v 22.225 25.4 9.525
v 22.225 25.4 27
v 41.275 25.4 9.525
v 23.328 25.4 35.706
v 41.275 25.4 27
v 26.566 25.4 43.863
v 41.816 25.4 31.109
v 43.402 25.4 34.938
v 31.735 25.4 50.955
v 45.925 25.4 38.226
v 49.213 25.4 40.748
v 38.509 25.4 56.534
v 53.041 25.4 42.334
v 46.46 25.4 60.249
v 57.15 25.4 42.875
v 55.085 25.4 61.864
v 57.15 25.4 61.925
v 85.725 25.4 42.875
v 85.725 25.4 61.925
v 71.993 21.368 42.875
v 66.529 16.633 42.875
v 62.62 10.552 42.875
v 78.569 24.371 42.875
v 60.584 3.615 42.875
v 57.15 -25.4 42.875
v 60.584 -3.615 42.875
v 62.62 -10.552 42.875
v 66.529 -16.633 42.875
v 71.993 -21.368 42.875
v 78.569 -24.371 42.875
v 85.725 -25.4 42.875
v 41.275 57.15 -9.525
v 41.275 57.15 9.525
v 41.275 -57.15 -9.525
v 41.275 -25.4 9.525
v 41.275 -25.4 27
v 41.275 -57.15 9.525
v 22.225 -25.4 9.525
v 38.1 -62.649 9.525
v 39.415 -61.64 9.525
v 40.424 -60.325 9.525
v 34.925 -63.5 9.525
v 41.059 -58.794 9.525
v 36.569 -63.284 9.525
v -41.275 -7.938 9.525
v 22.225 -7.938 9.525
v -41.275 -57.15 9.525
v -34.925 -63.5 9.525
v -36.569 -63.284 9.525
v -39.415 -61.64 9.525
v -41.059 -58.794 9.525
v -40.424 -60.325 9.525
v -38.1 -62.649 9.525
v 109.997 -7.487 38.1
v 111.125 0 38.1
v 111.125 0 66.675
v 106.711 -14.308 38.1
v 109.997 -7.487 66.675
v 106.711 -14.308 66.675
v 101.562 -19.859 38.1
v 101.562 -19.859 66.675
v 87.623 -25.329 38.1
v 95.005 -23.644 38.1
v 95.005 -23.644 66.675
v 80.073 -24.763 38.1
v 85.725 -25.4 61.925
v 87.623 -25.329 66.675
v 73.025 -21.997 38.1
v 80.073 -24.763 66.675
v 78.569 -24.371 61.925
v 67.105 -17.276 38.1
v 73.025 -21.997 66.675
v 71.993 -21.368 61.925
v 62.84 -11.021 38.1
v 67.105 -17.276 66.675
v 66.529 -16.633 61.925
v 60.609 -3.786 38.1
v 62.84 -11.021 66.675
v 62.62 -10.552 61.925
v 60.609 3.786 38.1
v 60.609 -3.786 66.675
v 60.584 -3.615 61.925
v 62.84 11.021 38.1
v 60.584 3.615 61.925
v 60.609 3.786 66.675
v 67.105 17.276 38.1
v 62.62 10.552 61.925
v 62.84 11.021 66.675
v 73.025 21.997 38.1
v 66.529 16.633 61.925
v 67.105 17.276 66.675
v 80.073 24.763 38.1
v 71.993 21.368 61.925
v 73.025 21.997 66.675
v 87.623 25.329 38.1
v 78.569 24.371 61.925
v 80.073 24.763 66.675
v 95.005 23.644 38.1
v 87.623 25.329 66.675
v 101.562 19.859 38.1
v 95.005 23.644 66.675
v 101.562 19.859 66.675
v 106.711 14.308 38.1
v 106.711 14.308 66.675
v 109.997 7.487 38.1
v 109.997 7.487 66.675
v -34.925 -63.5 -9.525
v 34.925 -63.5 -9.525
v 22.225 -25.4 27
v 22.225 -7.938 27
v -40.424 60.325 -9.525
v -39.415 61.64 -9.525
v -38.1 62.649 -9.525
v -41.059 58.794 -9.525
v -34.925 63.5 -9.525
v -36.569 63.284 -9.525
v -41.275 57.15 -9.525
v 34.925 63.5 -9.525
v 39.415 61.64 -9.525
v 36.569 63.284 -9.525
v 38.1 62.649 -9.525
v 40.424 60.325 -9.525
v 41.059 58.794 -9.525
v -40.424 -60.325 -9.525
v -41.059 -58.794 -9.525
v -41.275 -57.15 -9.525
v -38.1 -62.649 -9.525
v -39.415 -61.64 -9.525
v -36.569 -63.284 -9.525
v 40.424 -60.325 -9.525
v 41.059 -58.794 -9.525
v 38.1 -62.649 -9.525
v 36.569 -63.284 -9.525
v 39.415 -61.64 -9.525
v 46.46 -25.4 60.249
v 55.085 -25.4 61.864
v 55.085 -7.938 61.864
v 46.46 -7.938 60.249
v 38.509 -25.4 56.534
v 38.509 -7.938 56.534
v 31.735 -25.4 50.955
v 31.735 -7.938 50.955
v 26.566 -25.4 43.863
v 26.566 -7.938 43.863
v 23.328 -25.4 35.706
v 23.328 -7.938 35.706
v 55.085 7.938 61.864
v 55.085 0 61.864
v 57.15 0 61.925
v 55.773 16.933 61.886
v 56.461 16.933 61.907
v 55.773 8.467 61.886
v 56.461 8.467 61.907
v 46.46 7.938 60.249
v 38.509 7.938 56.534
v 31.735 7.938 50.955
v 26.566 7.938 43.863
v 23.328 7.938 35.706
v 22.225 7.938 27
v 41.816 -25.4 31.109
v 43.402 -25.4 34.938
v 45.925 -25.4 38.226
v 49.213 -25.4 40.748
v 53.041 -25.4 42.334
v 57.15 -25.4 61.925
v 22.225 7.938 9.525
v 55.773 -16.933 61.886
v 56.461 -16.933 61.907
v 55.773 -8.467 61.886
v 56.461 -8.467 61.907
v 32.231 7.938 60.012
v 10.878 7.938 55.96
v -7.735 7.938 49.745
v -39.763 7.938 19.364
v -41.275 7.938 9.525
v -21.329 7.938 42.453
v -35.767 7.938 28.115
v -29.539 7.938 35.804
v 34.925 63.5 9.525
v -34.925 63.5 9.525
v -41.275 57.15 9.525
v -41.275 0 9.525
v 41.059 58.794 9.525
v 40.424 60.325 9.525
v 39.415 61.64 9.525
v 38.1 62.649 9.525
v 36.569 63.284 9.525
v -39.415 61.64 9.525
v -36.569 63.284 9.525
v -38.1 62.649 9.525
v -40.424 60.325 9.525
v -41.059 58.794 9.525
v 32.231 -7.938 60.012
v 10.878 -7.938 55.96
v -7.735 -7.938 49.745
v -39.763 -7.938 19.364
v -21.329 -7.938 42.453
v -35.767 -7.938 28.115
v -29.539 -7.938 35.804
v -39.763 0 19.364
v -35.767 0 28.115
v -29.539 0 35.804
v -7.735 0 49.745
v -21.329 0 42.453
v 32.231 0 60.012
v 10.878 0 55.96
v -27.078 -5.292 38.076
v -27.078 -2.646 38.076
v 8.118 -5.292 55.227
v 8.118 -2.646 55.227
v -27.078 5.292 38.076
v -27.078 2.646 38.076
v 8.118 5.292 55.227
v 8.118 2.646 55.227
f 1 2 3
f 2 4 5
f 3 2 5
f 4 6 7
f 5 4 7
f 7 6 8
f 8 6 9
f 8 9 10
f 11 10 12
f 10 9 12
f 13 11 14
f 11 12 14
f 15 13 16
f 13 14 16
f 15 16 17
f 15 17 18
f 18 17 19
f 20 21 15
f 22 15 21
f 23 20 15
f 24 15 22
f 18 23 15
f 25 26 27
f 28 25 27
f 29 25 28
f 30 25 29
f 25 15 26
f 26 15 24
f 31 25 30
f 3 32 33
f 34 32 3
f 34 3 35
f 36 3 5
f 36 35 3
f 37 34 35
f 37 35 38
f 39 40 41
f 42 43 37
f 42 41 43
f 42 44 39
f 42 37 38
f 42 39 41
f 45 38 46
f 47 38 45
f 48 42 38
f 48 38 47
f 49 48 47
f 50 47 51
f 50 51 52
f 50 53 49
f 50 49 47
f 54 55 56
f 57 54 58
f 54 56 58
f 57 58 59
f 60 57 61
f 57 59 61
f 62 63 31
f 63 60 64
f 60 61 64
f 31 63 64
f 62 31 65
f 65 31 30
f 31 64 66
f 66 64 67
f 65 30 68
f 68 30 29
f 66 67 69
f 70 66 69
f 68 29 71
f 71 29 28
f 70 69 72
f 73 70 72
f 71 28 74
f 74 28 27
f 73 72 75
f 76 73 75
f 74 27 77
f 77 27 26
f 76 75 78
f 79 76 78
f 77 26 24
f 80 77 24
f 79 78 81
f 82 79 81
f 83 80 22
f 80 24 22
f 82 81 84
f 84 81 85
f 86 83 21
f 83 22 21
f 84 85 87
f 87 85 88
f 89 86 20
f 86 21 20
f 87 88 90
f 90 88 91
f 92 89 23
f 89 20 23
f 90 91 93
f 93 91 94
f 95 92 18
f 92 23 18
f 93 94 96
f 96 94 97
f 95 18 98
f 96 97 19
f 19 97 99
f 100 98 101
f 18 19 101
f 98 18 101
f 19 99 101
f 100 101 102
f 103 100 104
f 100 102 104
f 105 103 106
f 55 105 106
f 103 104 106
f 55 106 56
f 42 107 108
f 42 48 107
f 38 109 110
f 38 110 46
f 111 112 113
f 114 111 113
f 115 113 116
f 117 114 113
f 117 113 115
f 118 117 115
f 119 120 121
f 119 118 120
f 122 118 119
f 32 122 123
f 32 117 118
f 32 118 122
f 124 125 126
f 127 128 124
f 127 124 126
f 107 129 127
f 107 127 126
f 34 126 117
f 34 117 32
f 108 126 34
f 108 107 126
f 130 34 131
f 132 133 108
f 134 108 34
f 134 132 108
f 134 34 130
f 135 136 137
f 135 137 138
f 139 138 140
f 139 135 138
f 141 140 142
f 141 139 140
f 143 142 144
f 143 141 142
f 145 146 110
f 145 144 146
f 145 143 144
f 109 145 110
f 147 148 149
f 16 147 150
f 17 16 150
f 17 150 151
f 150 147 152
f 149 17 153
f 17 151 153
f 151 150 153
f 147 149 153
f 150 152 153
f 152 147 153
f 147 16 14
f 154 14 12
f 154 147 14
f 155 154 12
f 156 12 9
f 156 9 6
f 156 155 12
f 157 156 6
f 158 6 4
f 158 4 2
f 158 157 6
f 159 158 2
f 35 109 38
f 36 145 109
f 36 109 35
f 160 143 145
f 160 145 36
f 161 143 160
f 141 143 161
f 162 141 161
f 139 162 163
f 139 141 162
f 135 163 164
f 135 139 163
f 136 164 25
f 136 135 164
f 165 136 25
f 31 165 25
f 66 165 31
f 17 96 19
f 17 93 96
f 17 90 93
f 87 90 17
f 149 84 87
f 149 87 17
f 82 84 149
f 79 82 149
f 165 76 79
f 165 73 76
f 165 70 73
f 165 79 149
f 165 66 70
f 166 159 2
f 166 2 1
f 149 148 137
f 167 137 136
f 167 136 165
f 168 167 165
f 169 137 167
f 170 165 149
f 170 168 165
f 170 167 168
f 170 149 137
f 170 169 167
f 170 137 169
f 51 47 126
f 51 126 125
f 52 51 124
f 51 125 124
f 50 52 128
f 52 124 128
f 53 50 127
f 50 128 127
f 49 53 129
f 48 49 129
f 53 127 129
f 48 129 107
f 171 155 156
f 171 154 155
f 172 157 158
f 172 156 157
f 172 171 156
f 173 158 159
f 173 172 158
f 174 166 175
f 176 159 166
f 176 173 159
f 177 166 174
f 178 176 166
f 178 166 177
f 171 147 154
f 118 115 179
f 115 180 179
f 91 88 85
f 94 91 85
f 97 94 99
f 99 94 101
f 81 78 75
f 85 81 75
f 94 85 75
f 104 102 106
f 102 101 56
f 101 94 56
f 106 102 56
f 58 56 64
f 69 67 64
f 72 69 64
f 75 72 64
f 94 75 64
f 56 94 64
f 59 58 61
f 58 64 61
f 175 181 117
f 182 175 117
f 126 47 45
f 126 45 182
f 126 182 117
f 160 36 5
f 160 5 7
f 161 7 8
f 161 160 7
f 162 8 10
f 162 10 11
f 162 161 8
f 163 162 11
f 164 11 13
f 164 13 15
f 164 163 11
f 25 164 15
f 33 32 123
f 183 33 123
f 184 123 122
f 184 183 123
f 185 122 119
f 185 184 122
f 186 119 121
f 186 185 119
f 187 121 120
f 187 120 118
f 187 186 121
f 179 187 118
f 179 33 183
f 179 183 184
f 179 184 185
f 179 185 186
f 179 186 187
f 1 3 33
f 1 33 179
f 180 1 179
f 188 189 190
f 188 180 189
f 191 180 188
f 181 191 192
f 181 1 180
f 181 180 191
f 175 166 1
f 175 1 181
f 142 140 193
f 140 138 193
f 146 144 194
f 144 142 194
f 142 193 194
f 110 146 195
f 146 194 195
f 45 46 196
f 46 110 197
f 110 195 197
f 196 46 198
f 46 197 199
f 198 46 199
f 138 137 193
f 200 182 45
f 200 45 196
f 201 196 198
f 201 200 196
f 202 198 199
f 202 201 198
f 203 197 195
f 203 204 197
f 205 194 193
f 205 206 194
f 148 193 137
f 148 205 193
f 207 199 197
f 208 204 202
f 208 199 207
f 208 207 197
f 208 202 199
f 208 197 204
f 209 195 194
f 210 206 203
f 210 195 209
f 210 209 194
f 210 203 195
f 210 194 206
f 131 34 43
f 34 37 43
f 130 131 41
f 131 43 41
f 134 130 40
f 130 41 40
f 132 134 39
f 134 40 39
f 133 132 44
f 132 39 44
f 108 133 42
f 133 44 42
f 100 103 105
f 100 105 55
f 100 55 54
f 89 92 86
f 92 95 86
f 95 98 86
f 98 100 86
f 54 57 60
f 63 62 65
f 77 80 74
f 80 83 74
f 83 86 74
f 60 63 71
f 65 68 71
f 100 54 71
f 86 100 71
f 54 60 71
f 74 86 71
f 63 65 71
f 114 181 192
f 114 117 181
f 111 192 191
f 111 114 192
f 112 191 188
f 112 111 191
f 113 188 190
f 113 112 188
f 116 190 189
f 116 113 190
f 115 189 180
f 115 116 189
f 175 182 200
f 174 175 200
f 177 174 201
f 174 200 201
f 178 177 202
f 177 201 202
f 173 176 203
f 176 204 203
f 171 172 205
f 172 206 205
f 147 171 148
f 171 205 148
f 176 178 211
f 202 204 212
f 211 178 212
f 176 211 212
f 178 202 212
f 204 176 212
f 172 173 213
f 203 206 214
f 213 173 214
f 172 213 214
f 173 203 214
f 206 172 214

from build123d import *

# Parameters (mm, degrees)
F1_DEPTH = 63.5
F2_DEPTH = 7.9375
F0_W     = 25.4
F0_H     = 19.05
F3_DEPTH = 25.4
F5_R     = 6.35


with BuildPart() as f1:
    # F0 (on Front) → F1 (new body, symmetric)
    with BuildSketch(Plane.XZ):
        Polygon((-41.275, -9.525), (41.275, -9.525), (41.275, 9.525), (22.225, 9.525), (-41.275, 9.525), align=None)
    extrude(amount=F1_DEPTH, both=True)

    # F0 (on Front) → F2 (join, symmetric)
    with BuildSketch(Plane.XZ):
        with BuildLine():
            add(Edge.make_bspline(
                [(-41.275, 9.525), (-40.6536376941, 44.0692058558), (5.3086092688, 60.1907536905), (55.0853842739, 61.8641209915)],
                knots=[0, 0, 0, 0, 109.9854236751, 109.9854236751, 109.9854236751, 109.9854236751], degree=3))
            Line((-41.275, 9.525), (22.225, 9.525))
            Line((22.225, 9.525), (22.225, 27.0002))
            ThreePointArc((22.225, 27.0002), (31.7348241278, 50.9548333803), (55.0853842739, 61.8641209915))
        make_face()
    extrude(amount=F2_DEPTH, both=True)

    # F0 (on Front) → F3 (join, symmetric)
    with BuildSketch(Plane.XZ):
        with BuildLine():
            Line((22.225, 9.525), (41.275, 9.525))
            Line((41.275, 9.525), (41.275, 27.0002))
            ThreePointArc((41.275, 27.0002), (45.9246798487, 38.2255201513), (57.15, 42.8752))
            Line((57.15, 42.8752), (60.325, 42.8752))
            Line((60.325, 42.8752), (60.325, 61.9252))
            Line((60.325, 61.9252), (57.15, 61.9252))
            add(Edge.make_bspline(
                [(55.0853842739, 61.8641209915), (55.7728982919, 61.8872334466), (56.4611400065, 61.9075896253), (57.15, 61.9252)],
                knots=[109.9854236751, 109.9854236751, 109.9854236751, 109.9854236751, 111.5045361635, 111.5045361635, 111.5045361635, 111.5045361635], degree=3))
            ThreePointArc((55.0853842739, 61.8641209915), (31.7348241278, 50.9548333803), (22.225, 27.0002))
            Line((22.225, 27.0002), (22.225, 9.525))
        make_face()
        with Locations((73.025, 52.4002)):
            Rectangle(F0_W, F0_H)
    extrude(amount=F3_DEPTH, both=True)

    # F0 (on Front) → F4 (revolve)
    with BuildSketch(Plane.XZ):
        Polygon((85.725, 61.9252), (85.725, 42.8752), (85.725, 38.1), (111.125, 38.1), (111.125, 66.675), (85.725, 66.675), align=None)
    revolve(axis=Axis((85.725, 0, 52.3875), (0, 0, -1)))

    # F5
    f5_edges = [f1.edges().sort_by_distance(p)[0] for p in [
        (-41.275, -63.5, 0),
        (41.275, -63.5, 0),
        (41.275, 63.5, 0),
        (-41.275, 63.5, 0),
    ]]
    fillet(f5_edges, radius=F5_R)


solid = f1.part
